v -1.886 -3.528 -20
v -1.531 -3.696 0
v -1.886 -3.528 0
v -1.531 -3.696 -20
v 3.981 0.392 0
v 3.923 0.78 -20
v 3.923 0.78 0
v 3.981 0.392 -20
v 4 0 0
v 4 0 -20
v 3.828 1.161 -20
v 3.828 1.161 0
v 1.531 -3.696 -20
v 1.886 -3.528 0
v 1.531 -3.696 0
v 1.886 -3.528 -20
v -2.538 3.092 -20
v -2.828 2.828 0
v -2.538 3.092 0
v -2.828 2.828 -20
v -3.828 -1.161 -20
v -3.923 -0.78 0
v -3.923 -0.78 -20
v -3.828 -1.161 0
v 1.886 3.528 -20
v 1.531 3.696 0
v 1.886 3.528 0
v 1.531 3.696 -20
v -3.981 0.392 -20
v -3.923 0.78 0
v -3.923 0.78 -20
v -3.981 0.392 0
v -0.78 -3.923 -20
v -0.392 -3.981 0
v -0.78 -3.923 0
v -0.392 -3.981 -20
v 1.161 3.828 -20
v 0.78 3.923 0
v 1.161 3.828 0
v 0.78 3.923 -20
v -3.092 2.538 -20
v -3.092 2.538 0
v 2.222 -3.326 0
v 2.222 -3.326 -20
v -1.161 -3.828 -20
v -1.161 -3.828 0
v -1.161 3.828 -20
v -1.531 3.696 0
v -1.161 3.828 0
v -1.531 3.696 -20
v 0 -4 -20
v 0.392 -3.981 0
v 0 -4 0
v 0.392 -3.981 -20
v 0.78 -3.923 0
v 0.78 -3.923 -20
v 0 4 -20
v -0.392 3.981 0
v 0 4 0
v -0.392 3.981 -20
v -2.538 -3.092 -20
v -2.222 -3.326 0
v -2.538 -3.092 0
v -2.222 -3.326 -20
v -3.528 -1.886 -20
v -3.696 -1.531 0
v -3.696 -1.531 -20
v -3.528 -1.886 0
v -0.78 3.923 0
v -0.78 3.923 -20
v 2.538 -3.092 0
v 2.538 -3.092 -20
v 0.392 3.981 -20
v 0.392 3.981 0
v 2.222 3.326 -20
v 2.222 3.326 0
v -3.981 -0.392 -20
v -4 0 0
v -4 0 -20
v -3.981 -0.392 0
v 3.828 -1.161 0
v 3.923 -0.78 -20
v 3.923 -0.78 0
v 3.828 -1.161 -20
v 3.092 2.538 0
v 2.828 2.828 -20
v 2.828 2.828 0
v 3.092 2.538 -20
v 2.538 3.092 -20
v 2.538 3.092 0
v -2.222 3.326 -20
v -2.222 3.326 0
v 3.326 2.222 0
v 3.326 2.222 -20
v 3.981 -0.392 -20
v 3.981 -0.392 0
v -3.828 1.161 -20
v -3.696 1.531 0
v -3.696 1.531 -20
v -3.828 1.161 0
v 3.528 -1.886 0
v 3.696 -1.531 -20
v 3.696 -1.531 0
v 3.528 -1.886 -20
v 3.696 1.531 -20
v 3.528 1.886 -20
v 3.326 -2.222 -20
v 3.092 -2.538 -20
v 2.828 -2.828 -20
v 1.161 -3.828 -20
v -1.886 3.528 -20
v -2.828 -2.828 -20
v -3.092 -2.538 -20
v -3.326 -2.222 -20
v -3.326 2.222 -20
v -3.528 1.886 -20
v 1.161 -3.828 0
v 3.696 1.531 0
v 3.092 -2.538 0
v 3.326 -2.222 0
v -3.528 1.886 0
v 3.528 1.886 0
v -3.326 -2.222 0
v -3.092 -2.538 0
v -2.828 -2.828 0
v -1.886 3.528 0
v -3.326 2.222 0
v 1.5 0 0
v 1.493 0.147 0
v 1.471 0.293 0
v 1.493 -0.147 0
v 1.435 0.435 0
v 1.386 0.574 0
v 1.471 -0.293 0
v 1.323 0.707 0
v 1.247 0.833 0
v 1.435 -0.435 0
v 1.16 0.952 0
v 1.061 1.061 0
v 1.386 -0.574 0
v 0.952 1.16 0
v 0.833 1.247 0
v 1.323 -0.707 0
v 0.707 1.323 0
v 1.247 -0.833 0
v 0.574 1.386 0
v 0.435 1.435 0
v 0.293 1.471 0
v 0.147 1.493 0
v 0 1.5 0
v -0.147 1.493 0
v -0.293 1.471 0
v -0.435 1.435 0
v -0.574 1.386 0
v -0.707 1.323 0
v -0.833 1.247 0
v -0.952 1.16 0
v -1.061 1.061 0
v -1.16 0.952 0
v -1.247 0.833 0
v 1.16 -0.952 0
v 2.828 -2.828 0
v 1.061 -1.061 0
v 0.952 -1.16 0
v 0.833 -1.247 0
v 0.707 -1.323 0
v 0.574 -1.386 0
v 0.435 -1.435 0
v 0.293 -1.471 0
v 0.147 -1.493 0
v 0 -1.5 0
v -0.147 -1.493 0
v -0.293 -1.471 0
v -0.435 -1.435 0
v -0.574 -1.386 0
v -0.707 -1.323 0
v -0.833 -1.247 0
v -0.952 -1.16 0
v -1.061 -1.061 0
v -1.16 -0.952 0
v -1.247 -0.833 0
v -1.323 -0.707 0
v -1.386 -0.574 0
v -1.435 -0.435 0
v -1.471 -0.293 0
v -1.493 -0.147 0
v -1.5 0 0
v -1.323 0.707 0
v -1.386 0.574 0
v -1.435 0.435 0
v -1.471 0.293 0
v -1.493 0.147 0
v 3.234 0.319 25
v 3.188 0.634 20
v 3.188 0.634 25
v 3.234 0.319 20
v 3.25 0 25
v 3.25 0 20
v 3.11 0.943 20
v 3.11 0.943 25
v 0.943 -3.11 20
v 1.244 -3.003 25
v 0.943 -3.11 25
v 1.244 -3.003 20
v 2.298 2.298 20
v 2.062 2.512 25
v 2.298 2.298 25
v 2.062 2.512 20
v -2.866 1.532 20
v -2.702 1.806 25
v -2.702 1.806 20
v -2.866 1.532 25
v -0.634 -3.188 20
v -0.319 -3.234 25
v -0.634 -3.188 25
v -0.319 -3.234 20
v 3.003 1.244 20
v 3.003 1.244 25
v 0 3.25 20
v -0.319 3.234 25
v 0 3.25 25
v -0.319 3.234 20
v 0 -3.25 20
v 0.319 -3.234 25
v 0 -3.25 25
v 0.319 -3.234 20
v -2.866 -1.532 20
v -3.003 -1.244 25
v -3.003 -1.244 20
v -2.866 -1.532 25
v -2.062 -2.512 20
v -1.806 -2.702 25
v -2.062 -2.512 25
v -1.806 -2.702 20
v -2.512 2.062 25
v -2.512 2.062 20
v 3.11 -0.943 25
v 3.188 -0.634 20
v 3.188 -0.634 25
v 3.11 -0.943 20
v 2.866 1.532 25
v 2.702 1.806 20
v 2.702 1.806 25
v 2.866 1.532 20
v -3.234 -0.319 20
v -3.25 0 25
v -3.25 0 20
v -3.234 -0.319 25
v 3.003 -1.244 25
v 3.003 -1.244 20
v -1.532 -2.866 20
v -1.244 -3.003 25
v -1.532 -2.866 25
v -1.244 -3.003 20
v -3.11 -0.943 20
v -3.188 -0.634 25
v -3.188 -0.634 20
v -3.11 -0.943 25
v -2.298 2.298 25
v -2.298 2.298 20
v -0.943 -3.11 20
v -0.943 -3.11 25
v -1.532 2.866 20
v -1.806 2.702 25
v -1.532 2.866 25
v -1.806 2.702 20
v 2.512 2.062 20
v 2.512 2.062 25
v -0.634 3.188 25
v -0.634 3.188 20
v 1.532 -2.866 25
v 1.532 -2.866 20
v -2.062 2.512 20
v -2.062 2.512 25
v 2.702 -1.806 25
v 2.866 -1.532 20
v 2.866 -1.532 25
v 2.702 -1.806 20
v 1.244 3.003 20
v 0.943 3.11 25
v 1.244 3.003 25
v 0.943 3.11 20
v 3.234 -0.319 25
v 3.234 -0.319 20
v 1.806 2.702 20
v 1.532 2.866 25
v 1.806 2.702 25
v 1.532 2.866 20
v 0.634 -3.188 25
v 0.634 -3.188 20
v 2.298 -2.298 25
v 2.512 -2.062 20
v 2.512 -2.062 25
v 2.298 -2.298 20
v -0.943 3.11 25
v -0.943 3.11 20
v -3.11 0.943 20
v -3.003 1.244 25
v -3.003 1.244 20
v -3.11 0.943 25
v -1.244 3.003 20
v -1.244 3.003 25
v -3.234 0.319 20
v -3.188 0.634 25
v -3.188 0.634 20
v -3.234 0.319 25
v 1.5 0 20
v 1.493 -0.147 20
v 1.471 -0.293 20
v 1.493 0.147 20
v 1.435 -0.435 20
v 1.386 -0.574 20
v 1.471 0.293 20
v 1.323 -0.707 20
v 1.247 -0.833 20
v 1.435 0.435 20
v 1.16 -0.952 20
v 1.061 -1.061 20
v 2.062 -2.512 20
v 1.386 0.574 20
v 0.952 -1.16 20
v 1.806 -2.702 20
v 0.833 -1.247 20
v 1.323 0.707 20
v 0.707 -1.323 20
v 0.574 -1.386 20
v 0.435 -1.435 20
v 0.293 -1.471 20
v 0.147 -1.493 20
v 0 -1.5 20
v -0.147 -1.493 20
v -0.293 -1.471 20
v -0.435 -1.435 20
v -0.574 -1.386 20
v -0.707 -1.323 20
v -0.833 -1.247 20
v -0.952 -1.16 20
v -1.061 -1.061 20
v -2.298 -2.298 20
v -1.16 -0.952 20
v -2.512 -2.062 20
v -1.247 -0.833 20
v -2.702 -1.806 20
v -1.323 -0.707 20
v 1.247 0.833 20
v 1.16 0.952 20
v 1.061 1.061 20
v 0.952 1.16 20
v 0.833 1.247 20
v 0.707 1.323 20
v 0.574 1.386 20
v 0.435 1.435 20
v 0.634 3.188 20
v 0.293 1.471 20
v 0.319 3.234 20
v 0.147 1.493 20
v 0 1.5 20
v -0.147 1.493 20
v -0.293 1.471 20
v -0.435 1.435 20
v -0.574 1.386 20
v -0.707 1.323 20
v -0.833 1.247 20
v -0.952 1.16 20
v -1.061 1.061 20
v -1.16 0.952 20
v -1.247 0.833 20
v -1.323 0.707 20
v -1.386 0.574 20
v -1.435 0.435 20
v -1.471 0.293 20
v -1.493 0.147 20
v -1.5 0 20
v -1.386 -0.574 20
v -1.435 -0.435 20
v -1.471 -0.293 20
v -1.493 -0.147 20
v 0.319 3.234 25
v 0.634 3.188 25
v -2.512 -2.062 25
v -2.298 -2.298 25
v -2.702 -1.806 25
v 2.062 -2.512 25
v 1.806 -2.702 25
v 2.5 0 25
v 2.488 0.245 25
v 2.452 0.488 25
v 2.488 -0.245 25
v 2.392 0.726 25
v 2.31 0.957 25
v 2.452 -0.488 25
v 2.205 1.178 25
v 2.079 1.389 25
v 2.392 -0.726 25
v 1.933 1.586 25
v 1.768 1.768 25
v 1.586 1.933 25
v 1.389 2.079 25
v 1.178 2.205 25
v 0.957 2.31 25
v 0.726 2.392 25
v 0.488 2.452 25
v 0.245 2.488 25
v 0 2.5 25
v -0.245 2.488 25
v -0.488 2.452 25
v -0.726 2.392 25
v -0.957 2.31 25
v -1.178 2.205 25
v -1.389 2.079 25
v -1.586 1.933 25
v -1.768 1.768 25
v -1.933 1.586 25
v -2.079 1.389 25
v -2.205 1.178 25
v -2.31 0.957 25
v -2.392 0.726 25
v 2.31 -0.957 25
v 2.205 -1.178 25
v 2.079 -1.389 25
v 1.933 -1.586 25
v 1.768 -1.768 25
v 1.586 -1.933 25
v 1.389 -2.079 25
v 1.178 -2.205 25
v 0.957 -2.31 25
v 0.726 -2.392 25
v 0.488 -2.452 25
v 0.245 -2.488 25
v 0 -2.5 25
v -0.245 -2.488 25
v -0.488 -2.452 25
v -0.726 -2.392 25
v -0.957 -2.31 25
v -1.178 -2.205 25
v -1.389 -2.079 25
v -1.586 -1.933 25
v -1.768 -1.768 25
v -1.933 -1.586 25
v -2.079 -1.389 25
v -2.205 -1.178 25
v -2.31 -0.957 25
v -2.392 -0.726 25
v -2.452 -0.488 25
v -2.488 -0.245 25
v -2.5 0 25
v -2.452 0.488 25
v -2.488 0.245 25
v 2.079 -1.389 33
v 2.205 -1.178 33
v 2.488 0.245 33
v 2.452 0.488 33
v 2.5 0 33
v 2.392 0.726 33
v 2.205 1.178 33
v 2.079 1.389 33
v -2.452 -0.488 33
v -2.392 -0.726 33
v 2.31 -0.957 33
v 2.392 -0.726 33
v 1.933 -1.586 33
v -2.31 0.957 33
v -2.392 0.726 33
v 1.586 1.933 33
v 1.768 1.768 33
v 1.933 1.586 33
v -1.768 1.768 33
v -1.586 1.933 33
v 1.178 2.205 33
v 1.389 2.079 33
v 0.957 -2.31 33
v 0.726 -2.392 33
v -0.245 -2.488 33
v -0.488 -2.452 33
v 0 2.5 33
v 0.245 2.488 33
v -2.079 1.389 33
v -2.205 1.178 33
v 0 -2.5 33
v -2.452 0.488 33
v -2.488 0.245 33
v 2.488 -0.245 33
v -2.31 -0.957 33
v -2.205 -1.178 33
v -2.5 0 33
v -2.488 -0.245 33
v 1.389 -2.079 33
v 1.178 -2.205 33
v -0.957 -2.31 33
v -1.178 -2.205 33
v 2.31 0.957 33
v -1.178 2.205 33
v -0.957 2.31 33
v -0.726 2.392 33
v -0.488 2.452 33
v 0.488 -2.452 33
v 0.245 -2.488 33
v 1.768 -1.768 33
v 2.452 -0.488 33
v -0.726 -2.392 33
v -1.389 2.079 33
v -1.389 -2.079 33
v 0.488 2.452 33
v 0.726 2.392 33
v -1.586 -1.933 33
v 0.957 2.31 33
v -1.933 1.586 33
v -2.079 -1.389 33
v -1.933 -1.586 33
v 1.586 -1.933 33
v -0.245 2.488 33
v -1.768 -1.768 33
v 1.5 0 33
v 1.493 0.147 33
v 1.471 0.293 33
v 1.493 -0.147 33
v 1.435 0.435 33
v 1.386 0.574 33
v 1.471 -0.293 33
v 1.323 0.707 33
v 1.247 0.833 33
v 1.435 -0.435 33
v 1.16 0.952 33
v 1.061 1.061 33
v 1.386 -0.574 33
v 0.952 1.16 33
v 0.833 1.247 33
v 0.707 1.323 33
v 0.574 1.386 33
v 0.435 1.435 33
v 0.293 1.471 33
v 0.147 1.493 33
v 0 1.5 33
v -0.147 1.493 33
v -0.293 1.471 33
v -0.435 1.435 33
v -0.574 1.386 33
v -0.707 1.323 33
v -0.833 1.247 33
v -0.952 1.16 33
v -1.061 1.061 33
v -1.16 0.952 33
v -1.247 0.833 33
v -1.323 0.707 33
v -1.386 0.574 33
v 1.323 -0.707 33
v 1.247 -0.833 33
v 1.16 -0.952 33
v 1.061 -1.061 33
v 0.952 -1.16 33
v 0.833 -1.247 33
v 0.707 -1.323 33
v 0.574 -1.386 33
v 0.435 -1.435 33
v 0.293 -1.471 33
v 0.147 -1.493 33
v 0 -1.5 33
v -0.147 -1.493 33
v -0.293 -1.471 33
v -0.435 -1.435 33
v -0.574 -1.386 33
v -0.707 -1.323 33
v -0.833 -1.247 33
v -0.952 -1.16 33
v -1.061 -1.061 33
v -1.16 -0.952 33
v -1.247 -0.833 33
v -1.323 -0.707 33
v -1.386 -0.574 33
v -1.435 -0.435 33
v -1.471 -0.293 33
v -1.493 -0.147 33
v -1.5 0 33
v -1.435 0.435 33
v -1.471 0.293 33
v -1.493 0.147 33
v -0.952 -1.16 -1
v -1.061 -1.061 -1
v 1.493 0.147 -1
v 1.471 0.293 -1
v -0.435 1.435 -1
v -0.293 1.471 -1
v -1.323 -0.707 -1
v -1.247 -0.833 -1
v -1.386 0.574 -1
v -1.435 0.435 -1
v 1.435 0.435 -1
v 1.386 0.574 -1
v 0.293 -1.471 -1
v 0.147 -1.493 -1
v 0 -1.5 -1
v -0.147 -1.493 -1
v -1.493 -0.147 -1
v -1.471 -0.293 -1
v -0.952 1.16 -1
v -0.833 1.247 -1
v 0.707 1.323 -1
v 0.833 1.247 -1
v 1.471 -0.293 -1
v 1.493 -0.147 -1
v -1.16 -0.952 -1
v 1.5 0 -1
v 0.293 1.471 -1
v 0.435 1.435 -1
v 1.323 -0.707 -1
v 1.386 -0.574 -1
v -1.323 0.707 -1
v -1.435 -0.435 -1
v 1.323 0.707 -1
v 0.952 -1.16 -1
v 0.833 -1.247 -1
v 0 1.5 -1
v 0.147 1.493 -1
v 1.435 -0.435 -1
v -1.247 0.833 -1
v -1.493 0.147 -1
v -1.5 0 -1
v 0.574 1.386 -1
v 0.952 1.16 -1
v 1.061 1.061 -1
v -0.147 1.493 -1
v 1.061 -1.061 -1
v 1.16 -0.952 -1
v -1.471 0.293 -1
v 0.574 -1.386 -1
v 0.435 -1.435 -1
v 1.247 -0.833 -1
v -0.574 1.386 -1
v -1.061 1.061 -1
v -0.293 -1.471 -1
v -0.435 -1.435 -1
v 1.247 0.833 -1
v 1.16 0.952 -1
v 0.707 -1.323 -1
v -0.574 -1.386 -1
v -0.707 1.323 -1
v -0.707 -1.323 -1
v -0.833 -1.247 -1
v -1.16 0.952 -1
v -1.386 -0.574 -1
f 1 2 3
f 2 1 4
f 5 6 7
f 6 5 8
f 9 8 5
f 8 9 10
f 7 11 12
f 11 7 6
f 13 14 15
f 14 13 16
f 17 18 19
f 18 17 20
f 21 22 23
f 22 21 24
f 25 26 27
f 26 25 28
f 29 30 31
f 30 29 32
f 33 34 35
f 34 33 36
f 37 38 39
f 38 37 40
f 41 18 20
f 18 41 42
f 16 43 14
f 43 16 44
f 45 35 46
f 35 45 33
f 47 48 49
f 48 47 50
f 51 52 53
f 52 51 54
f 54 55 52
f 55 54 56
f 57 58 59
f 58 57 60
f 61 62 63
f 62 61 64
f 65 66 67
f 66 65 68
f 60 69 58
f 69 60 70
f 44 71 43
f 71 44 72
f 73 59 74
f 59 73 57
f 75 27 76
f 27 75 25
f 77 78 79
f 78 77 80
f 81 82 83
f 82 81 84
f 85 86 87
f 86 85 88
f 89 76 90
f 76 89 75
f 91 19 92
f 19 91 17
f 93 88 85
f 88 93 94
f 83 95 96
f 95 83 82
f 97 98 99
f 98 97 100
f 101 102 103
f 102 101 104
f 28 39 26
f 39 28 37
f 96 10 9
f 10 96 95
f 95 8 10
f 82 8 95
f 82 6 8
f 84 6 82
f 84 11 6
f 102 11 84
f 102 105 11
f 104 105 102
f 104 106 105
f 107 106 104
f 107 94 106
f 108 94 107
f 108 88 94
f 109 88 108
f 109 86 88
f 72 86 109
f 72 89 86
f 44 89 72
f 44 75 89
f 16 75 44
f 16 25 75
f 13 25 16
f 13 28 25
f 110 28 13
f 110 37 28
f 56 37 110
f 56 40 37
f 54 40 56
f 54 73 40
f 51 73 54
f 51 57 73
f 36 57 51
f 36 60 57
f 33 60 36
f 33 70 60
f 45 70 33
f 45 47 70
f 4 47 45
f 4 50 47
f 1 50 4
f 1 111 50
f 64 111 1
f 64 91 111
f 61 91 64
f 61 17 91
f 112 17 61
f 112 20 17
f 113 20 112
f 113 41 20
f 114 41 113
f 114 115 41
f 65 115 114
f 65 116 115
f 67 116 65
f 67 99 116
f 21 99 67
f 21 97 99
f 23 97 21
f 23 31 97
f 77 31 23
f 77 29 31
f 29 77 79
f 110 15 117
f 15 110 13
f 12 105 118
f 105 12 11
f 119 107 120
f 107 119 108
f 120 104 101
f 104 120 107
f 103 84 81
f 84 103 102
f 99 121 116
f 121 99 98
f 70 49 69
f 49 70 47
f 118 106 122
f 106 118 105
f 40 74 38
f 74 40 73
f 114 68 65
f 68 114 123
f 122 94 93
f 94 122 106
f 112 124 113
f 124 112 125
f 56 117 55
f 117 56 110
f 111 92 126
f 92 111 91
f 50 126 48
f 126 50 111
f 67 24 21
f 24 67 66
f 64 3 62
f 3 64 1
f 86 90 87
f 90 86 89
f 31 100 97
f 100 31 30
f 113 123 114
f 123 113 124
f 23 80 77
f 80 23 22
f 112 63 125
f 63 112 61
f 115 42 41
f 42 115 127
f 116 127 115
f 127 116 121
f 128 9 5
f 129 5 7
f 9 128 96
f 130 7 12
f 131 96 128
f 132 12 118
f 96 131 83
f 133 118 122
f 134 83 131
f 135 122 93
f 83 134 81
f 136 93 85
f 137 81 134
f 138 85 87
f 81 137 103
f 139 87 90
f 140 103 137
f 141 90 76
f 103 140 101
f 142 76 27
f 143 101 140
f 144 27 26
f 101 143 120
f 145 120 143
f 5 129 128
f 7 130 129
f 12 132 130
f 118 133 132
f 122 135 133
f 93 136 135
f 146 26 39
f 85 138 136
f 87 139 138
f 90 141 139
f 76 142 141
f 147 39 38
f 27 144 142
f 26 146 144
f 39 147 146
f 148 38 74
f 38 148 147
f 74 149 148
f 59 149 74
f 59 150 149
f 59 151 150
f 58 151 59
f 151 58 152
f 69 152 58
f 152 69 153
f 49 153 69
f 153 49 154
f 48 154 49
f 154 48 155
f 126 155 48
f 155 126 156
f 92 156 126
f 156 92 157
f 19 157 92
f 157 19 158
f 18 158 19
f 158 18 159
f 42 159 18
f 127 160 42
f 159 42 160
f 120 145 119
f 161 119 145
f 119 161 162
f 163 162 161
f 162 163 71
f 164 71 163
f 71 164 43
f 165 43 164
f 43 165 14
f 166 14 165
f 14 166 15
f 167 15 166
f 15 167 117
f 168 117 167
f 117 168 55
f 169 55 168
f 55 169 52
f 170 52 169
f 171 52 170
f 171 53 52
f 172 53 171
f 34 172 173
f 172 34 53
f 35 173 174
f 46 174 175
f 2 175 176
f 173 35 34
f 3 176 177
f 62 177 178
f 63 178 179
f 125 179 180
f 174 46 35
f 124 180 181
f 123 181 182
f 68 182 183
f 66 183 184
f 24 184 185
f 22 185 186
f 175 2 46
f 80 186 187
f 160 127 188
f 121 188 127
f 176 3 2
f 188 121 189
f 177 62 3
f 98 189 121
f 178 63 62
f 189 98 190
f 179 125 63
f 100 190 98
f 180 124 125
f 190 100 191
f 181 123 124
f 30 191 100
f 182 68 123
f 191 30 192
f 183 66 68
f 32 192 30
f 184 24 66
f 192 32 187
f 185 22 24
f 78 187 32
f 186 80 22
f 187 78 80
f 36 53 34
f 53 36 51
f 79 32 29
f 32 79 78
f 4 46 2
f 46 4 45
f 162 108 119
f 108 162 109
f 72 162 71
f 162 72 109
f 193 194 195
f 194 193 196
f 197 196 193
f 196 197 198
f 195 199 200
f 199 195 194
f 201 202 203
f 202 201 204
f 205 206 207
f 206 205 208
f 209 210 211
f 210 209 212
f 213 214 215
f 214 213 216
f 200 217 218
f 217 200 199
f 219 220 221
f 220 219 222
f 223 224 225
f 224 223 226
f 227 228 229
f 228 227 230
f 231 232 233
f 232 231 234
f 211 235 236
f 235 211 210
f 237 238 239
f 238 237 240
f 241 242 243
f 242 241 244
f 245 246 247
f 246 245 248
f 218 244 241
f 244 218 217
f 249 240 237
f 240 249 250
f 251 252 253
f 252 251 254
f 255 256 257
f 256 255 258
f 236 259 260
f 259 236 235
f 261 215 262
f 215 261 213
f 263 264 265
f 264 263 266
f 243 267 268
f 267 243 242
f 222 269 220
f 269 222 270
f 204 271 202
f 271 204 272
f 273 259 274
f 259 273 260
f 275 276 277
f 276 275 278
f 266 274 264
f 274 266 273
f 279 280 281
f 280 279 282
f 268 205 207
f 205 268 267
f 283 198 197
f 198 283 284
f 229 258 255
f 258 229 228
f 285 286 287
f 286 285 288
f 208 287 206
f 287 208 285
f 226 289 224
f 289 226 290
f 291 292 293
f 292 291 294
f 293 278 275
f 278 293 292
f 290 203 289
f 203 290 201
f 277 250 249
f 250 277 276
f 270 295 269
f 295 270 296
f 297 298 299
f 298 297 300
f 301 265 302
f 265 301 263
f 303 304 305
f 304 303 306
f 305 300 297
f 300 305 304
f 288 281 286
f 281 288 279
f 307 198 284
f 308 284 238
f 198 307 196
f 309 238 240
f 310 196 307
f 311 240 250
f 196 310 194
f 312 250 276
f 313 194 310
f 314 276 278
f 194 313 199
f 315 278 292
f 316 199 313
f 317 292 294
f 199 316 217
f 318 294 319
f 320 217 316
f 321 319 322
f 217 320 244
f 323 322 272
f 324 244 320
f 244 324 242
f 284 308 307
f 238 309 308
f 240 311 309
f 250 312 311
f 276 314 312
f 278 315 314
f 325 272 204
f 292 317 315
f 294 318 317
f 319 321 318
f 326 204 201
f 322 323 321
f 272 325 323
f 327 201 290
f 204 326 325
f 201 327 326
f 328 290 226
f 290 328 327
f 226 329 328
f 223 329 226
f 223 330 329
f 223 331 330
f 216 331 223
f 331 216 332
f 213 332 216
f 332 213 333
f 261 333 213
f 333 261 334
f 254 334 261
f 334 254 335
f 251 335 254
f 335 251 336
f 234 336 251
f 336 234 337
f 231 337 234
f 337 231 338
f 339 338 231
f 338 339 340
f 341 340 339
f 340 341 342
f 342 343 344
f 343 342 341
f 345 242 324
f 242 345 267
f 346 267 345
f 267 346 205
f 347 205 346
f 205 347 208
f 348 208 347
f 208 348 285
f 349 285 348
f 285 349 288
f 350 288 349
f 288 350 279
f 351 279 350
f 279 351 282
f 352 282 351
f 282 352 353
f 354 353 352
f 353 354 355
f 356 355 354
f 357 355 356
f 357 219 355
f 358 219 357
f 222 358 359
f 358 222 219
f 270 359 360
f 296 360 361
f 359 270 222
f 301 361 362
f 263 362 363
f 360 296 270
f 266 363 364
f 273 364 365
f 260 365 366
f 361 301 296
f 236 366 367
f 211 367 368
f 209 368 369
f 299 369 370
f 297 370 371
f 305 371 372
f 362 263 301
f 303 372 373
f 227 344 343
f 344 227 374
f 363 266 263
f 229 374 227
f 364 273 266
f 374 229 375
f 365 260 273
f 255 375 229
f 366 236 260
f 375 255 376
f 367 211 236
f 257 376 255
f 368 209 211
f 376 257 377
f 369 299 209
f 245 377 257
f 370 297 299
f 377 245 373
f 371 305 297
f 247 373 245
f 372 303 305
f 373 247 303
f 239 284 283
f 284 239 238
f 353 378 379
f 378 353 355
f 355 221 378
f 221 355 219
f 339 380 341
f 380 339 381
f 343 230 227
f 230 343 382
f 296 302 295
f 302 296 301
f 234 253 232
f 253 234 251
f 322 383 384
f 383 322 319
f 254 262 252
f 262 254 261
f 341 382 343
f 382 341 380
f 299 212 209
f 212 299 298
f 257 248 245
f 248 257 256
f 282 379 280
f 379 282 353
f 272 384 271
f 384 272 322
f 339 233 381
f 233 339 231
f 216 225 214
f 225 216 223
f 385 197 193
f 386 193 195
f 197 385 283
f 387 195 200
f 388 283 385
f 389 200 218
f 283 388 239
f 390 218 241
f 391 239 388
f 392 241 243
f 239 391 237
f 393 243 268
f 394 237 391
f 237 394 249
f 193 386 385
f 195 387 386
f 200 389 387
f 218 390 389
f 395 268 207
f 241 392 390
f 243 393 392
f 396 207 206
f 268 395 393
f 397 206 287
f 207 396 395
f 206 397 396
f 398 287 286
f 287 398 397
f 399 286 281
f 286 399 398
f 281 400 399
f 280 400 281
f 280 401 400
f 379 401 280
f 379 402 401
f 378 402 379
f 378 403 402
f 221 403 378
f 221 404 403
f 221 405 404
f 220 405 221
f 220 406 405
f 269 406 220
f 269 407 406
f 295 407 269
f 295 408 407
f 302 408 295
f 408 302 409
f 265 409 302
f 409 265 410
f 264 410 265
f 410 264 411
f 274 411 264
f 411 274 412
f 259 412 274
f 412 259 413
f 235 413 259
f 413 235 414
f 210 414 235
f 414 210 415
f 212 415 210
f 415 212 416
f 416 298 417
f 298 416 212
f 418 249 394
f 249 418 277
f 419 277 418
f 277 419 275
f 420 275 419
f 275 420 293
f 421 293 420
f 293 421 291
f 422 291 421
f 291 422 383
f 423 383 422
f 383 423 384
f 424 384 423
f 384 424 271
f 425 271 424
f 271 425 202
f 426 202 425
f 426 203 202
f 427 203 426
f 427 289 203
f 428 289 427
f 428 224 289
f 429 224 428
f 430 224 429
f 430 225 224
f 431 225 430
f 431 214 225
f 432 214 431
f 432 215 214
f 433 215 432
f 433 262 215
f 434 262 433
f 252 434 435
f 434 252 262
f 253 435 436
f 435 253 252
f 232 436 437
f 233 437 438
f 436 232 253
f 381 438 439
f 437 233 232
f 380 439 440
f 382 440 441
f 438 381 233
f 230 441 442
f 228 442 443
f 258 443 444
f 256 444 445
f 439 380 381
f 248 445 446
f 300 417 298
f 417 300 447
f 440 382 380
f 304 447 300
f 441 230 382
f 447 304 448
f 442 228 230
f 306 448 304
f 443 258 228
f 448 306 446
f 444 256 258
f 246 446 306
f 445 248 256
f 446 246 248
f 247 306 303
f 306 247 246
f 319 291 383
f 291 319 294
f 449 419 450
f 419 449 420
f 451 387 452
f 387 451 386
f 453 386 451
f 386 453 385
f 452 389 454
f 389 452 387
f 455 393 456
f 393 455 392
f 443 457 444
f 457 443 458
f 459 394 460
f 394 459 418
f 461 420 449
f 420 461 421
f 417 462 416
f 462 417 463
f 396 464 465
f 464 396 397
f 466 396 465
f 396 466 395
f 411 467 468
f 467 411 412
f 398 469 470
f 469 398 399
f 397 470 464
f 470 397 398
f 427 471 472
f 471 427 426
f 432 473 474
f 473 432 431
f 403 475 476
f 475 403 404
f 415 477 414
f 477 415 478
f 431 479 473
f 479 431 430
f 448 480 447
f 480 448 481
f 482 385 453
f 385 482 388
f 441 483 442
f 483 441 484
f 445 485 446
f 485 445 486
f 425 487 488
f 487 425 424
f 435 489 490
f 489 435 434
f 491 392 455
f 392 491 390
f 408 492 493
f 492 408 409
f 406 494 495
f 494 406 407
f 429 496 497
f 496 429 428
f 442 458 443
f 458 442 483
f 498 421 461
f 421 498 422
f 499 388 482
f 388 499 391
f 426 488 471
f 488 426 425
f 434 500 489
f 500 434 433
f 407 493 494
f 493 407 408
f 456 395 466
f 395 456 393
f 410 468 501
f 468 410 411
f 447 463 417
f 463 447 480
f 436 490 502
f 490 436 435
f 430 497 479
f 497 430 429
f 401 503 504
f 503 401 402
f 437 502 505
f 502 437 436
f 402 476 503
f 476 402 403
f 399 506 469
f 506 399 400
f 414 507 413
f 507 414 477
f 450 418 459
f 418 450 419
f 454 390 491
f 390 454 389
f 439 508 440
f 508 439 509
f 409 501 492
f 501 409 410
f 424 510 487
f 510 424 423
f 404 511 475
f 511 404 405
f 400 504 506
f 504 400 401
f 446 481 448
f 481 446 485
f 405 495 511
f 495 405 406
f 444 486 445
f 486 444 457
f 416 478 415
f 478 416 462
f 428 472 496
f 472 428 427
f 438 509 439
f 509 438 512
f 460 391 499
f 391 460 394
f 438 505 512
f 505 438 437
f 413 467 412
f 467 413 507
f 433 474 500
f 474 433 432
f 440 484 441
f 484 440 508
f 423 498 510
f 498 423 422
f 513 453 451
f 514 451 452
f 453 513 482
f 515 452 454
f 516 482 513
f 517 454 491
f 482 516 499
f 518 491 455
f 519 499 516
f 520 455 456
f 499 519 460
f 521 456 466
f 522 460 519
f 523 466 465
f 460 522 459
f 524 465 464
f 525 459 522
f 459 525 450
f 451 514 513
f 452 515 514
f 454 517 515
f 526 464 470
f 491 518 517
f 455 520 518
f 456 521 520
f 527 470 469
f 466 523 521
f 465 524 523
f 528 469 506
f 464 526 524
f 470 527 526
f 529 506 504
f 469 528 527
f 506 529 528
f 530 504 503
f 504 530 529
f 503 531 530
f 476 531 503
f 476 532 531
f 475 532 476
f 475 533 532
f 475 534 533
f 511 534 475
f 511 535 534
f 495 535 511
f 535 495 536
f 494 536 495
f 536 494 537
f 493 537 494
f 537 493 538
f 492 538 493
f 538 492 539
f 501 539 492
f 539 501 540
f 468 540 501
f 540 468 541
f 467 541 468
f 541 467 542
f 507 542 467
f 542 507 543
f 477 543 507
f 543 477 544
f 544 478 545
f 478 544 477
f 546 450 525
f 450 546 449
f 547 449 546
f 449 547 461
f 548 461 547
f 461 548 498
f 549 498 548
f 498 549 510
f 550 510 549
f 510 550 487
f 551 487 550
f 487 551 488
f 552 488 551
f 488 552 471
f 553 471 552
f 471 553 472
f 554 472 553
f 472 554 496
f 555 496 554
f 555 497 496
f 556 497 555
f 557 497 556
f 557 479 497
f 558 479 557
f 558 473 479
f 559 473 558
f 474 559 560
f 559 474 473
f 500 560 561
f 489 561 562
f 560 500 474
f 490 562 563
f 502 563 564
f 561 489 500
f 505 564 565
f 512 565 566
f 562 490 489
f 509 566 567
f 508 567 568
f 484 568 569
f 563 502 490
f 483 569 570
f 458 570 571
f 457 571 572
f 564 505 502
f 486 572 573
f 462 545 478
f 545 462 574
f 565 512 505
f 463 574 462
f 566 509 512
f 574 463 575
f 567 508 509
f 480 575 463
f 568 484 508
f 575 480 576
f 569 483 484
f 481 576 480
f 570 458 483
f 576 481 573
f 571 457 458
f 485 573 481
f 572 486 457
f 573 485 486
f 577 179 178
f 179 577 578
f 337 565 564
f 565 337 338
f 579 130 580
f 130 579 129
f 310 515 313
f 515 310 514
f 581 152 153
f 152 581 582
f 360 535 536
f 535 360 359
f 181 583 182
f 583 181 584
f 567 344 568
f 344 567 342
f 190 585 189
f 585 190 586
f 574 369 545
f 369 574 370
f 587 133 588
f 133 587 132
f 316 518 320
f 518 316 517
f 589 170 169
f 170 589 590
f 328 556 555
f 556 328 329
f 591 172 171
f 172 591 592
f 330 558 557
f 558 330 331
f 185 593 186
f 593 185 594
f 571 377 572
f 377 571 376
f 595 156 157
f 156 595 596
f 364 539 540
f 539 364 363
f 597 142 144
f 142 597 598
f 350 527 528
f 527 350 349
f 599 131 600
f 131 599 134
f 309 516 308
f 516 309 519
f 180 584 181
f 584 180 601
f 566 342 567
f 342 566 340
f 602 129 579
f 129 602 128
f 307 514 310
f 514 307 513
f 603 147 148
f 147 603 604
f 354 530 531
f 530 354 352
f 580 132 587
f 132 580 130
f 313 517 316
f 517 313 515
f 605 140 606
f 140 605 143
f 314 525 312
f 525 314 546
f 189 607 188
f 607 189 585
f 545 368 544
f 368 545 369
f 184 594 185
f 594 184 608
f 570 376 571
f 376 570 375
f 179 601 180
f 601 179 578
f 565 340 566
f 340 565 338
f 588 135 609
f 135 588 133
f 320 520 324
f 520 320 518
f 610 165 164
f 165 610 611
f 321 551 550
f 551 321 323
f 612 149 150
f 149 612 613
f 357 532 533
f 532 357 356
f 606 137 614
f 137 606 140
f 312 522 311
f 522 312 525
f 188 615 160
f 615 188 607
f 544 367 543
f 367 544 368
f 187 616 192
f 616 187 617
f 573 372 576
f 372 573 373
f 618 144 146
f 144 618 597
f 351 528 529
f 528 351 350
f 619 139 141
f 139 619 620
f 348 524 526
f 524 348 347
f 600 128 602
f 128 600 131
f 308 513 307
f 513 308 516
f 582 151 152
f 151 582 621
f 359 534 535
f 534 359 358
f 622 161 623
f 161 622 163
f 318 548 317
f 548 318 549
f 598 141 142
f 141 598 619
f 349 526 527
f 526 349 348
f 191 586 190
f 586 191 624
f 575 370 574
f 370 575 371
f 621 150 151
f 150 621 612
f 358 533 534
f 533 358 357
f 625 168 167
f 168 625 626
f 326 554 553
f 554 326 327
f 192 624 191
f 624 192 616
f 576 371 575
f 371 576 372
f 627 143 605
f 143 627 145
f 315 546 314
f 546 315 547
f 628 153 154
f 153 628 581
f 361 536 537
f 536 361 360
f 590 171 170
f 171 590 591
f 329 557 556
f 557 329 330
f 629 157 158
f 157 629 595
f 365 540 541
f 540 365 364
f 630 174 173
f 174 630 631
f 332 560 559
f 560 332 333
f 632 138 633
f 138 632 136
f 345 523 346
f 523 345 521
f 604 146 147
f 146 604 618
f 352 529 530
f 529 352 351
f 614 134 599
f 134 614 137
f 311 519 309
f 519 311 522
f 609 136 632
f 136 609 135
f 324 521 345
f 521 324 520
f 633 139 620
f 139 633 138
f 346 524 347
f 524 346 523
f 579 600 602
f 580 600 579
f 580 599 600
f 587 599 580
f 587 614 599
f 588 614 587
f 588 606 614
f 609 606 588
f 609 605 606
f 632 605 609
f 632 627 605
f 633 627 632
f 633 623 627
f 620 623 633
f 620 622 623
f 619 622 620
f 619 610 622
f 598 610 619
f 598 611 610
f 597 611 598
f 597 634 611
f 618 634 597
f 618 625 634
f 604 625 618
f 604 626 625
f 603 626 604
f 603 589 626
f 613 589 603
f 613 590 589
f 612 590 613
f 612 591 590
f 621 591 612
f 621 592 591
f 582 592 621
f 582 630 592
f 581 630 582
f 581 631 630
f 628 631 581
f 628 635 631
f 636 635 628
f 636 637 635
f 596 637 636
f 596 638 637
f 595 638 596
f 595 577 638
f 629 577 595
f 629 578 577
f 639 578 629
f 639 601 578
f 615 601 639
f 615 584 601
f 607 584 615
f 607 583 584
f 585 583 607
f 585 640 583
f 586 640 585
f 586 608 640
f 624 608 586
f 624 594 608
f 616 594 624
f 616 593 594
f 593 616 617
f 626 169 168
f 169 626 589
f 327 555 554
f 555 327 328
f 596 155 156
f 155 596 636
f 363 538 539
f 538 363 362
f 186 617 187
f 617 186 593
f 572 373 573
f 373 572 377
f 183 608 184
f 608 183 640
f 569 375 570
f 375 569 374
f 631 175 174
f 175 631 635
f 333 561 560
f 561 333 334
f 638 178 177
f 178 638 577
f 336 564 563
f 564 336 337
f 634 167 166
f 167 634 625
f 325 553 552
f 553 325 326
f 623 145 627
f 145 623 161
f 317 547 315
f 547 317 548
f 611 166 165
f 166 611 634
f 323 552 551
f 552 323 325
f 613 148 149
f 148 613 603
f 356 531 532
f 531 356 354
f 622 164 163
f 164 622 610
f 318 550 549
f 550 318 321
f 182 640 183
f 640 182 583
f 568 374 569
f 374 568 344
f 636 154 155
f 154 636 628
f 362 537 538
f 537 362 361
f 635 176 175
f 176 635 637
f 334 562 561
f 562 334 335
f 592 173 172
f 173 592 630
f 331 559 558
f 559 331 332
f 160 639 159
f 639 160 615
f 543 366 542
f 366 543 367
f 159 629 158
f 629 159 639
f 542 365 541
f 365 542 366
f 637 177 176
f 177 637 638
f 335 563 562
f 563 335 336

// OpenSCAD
// Hose-barb reducer: 8 mm tubing (barb) to 5 mm tubing (barb)
// Print orientation: standing upright along Z

$fn = 64;

// ---- Dimensions (mm) ----
t1_od     = 8;    // outer diameter of 8 mm tubing
t2_od     = 5;    // outer diameter of 5 mm tubing
bore      = 3;    // through-bore diameter
flange    = 1.5;  // flare at end of a barb

lz        = 20;   // length of 8 mm barb section
collar    = 5;    // length of collar section
rz        = 8;    // length of 5 mm barb section

// ---- Derived ----
inner_r   = bore / 2;
flange_r  = t1_od / 2 + flange;
collar_d  = t2_od + flange;

// ---- Model ----
difference() {
    union() {
        // 8 mm barb
        rotate_extrude() translate([0, 0, lz])
            circle(r = flange_r);
        translate([0, 0, -lz])
            cylinder(h = lz, r = t1_od / 2);

        // collar
        translate([0, 0, lz])
            cylinder(h = collar, d = collar_d);

        // 5 mm barb
        translate([0, 0, lz + collar])
            cylinder(h = rz, r = t2_od / 2);
    }
    // through bore
    translate([0, 0, -1])
        cylinder(h = lz + collar + rz + 2, r = inner_r);
}
